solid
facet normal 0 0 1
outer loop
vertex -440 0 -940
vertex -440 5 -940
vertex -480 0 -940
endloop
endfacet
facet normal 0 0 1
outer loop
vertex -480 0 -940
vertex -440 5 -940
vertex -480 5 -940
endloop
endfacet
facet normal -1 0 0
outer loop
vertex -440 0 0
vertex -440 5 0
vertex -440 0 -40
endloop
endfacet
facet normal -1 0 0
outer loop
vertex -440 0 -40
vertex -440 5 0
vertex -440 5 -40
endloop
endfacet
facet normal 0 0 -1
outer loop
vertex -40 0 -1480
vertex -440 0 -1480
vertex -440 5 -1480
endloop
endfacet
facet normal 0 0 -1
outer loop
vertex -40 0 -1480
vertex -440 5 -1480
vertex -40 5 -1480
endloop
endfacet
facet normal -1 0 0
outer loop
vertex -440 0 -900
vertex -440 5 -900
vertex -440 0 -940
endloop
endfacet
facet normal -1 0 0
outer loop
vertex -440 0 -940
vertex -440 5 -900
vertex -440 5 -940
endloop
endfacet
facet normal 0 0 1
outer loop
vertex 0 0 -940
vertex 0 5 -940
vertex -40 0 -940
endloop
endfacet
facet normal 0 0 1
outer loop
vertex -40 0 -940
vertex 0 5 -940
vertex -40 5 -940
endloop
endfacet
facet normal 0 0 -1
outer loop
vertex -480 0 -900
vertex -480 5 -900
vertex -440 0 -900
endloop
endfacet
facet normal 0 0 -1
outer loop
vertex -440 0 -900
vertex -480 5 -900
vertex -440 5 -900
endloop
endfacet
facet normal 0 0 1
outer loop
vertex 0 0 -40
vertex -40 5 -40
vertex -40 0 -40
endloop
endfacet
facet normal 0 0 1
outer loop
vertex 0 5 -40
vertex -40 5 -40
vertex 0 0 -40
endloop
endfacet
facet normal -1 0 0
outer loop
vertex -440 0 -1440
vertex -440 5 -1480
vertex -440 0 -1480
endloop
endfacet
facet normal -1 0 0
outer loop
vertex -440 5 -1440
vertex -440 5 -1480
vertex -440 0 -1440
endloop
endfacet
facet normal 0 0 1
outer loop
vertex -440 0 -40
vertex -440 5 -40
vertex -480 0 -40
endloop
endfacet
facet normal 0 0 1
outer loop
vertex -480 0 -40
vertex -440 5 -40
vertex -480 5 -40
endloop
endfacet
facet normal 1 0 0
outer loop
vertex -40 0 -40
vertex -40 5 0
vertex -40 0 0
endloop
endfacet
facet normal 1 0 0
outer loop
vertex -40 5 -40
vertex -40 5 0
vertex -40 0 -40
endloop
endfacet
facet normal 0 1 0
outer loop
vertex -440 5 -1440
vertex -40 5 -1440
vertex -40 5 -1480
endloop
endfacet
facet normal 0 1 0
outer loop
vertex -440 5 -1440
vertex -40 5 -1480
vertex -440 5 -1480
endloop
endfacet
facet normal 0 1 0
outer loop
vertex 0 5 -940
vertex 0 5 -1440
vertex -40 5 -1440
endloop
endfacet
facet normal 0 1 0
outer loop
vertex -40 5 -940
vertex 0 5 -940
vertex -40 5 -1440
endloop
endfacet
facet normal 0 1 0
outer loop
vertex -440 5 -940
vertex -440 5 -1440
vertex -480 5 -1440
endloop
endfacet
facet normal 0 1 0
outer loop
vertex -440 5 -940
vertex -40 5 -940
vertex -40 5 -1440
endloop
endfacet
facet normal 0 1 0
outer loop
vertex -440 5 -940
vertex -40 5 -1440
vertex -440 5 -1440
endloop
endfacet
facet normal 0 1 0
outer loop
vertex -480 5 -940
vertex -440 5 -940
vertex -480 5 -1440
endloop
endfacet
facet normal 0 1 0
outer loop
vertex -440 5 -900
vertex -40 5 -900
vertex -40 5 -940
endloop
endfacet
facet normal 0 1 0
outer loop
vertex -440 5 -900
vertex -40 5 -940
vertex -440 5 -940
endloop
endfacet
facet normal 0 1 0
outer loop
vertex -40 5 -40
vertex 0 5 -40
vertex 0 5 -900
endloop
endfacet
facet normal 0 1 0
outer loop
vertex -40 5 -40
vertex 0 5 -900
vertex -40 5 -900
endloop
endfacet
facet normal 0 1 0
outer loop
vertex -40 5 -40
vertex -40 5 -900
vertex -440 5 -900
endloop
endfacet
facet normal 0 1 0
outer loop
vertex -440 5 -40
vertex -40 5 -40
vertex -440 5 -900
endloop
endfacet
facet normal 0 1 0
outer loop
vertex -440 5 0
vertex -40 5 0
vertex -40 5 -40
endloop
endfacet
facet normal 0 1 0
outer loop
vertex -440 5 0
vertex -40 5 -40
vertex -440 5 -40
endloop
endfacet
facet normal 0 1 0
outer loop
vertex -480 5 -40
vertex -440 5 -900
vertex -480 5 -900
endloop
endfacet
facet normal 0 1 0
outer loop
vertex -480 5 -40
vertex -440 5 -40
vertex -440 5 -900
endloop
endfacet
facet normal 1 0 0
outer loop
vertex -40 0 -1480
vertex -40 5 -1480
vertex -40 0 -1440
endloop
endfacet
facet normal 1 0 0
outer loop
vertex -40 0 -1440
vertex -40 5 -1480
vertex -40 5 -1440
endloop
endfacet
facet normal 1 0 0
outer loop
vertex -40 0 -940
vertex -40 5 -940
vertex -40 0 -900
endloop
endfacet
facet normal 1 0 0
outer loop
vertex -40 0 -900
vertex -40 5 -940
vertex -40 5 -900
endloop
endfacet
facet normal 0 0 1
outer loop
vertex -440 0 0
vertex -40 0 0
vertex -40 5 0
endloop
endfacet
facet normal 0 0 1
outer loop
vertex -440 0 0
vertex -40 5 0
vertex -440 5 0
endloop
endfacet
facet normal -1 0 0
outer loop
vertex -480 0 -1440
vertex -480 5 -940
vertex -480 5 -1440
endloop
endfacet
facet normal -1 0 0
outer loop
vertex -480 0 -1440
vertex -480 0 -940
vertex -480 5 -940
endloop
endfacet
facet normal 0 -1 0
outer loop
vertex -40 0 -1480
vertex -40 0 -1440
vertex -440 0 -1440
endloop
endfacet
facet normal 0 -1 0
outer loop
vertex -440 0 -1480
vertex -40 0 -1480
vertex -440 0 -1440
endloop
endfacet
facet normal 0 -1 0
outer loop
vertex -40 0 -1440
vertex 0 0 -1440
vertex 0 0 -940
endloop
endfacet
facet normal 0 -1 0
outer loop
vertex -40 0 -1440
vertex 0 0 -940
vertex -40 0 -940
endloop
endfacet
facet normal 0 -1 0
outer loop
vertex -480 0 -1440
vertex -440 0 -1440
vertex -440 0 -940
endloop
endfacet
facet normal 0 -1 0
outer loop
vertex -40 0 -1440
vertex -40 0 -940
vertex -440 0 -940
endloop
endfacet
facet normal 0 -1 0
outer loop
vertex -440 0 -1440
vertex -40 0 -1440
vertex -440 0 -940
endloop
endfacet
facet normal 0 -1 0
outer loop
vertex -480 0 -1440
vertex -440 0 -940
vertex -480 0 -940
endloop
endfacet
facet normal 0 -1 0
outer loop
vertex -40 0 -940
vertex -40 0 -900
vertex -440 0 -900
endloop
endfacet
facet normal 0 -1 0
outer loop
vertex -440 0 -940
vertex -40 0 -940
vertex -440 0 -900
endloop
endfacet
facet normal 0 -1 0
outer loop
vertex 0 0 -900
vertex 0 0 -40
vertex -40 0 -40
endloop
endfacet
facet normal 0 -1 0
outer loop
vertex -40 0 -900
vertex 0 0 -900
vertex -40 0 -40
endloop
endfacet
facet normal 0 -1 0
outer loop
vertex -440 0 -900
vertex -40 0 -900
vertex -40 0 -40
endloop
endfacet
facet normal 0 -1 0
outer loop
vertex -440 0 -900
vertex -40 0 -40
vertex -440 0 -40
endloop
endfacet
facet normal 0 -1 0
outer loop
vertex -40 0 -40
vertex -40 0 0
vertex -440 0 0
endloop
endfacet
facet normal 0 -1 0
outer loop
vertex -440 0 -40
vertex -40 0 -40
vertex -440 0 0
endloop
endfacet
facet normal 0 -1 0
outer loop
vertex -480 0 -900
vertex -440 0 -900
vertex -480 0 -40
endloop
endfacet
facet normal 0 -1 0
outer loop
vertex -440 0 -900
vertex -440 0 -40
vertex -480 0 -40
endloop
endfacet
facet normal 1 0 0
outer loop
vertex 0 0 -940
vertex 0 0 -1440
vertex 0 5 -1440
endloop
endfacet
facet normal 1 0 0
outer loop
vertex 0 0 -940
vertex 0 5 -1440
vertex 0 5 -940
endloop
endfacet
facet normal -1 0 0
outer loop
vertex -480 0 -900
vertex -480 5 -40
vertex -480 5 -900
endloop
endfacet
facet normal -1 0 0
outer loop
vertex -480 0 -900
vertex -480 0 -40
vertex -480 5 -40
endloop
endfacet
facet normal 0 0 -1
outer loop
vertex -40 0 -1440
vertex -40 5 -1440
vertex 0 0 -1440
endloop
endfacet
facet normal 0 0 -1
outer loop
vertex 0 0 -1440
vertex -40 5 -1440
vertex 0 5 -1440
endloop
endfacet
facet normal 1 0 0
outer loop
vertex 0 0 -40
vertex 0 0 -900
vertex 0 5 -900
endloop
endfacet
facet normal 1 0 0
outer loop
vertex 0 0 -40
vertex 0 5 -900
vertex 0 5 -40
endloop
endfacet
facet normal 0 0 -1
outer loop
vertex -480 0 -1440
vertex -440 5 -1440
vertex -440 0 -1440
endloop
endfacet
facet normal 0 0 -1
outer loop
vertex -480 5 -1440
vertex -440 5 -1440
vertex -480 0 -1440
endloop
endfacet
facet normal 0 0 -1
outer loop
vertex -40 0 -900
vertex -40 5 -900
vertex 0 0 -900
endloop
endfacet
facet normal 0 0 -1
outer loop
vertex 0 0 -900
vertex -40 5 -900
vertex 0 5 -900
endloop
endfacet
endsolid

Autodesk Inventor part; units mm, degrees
ref_plane "YZ Plane" through (0, 0, 0) normal (1, 0, 0) x (0, 1, 0)
ref_plane "XZ Plane" through (0, 0, 0) normal (0, 1, 0) x (-1, 0, 0)
ref_plane "XY Plane" through (0, 0, 0) normal (0, 0, 1) x (1, 0, 0)
sketch "Sketch1" plane through (0, 0, 0) normal (0, 1, 0) x (-1, 0, 0)
  line L0 (0, 0) -> (480, 0)
  line L1 (480, 0) -> (480, -1480)
  line L2 (480, -1480) -> (0, -1480)
  line L3 (0, -1480) -> (0, 0)
  dimension "d0" = 480
  dimension "d1" = 1480
extrude "Extrusion1" add sketch "Sketch1" along normal blind 5
sketch "Sketch2" plane through (0, 5, 0) normal (0, 1, 0) x (1, 0, 0)
  line L0 (0, 0) -> (-40, 0)
  line L1 (-40, 0) -> (-40, 40)
  line L2 (-40, 40) -> (0, 40)
  line L3 (0, 40) -> (0, 0)
  dimension "d4" = 40
  dimension "d5" = 40
extrude "Extrusion2" cut sketch "Sketch2" against normal blind 10
sketch "Sketch3" plane through (0, 5, 0) normal (0, 1, 0) x (1, 0, 0)
  line L0 (-480, 0) -> (-440, 0)
  line L1 (-440, 0) -> (-440, 40)
  line L2 (-440, 40) -> (-480, 40)
  line L3 (-480, 40) -> (-480, 0)
  point P0 (0, 0)
  dimension "d8" = 40
  dimension "d9" = 40
extrude "Extrusion3" cut sketch "Sketch3" against normal blind 10
sketch "Sketch4" plane through (0, 5, 0) normal (0, 1, 0) x (1, 0, 0)
  line L0 (0, 1480) -> (-480, 1480) projected
  line L1 (0, 1480) -> (-40, 1480)
  line L2 (-40, 1480) -> (-40, 1440)
  line L3 (-40, 1440) -> (0, 1440)
  line L4 (0, 1440) -> (0, 1480)
  point P0 (0, 0)
  dimension "d12" = 40
  dimension "d13" = 40
extrude "Extrusion4" cut sketch "Sketch4" against normal blind 10
sketch "Sketch5" plane through (0, 5, 0) normal (0, 1, 0) x (1, 0, 0)
  line L0 (-40, 1480) -> (-480, 1480) projected
  line L1 (-480, 1480) -> (-440, 1480)
  line L2 (-440, 1480) -> (-440, 1440)
  line L3 (-440, 1440) -> (-480, 1440)
  line L4 (-480, 1440) -> (-480, 1480)
  point P0 (0, 0)
  dimension "d16" = 40
  dimension "d17" = 40
extrude "Extrusion5" cut sketch "Sketch5" against normal blind 10
sketch "Sketch7" plane through (0, 5, 0) normal (0, 1, 0) x (1, 0, 0)
  line L0 (0, 40) -> (0, 1440) projected
  line L1 (0, 940) -> (-40, 940)
  line L2 (-40, 940) -> (-40, 900)
  line L3 (-40, 900) -> (0, 900)
  line L4 (0, 900) -> (0, 940)
  point P0 (0, 0)
  point P1 (0, 760)
  point P2 (0, 900)
  dimension "d24" = 40
  dimension "d25" = 40
extrude "Extrusion7" cut sketch "Sketch7" against normal blind 10
sketch "Sketch8" plane through (0, 5, 0) normal (0, 1, 0) x (1, 0, 0)
  line L0 (-480, 1440) -> (-480, 40) projected
  line L1 (-480, 900) -> (-440, 900)
  line L2 (-440, 900) -> (-440, 940)
  line L3 (-440, 940) -> (-480, 940)
  line L4 (-480, 940) -> (-480, 900)
  point P0 (0, 0)
  dimension "d28" = 40
  dimension "d29" = 40
extrude "Extrusion8" cut sketch "Sketch8" against normal blind 10
properties part number "benchtop" material "Aluminum 6061"
